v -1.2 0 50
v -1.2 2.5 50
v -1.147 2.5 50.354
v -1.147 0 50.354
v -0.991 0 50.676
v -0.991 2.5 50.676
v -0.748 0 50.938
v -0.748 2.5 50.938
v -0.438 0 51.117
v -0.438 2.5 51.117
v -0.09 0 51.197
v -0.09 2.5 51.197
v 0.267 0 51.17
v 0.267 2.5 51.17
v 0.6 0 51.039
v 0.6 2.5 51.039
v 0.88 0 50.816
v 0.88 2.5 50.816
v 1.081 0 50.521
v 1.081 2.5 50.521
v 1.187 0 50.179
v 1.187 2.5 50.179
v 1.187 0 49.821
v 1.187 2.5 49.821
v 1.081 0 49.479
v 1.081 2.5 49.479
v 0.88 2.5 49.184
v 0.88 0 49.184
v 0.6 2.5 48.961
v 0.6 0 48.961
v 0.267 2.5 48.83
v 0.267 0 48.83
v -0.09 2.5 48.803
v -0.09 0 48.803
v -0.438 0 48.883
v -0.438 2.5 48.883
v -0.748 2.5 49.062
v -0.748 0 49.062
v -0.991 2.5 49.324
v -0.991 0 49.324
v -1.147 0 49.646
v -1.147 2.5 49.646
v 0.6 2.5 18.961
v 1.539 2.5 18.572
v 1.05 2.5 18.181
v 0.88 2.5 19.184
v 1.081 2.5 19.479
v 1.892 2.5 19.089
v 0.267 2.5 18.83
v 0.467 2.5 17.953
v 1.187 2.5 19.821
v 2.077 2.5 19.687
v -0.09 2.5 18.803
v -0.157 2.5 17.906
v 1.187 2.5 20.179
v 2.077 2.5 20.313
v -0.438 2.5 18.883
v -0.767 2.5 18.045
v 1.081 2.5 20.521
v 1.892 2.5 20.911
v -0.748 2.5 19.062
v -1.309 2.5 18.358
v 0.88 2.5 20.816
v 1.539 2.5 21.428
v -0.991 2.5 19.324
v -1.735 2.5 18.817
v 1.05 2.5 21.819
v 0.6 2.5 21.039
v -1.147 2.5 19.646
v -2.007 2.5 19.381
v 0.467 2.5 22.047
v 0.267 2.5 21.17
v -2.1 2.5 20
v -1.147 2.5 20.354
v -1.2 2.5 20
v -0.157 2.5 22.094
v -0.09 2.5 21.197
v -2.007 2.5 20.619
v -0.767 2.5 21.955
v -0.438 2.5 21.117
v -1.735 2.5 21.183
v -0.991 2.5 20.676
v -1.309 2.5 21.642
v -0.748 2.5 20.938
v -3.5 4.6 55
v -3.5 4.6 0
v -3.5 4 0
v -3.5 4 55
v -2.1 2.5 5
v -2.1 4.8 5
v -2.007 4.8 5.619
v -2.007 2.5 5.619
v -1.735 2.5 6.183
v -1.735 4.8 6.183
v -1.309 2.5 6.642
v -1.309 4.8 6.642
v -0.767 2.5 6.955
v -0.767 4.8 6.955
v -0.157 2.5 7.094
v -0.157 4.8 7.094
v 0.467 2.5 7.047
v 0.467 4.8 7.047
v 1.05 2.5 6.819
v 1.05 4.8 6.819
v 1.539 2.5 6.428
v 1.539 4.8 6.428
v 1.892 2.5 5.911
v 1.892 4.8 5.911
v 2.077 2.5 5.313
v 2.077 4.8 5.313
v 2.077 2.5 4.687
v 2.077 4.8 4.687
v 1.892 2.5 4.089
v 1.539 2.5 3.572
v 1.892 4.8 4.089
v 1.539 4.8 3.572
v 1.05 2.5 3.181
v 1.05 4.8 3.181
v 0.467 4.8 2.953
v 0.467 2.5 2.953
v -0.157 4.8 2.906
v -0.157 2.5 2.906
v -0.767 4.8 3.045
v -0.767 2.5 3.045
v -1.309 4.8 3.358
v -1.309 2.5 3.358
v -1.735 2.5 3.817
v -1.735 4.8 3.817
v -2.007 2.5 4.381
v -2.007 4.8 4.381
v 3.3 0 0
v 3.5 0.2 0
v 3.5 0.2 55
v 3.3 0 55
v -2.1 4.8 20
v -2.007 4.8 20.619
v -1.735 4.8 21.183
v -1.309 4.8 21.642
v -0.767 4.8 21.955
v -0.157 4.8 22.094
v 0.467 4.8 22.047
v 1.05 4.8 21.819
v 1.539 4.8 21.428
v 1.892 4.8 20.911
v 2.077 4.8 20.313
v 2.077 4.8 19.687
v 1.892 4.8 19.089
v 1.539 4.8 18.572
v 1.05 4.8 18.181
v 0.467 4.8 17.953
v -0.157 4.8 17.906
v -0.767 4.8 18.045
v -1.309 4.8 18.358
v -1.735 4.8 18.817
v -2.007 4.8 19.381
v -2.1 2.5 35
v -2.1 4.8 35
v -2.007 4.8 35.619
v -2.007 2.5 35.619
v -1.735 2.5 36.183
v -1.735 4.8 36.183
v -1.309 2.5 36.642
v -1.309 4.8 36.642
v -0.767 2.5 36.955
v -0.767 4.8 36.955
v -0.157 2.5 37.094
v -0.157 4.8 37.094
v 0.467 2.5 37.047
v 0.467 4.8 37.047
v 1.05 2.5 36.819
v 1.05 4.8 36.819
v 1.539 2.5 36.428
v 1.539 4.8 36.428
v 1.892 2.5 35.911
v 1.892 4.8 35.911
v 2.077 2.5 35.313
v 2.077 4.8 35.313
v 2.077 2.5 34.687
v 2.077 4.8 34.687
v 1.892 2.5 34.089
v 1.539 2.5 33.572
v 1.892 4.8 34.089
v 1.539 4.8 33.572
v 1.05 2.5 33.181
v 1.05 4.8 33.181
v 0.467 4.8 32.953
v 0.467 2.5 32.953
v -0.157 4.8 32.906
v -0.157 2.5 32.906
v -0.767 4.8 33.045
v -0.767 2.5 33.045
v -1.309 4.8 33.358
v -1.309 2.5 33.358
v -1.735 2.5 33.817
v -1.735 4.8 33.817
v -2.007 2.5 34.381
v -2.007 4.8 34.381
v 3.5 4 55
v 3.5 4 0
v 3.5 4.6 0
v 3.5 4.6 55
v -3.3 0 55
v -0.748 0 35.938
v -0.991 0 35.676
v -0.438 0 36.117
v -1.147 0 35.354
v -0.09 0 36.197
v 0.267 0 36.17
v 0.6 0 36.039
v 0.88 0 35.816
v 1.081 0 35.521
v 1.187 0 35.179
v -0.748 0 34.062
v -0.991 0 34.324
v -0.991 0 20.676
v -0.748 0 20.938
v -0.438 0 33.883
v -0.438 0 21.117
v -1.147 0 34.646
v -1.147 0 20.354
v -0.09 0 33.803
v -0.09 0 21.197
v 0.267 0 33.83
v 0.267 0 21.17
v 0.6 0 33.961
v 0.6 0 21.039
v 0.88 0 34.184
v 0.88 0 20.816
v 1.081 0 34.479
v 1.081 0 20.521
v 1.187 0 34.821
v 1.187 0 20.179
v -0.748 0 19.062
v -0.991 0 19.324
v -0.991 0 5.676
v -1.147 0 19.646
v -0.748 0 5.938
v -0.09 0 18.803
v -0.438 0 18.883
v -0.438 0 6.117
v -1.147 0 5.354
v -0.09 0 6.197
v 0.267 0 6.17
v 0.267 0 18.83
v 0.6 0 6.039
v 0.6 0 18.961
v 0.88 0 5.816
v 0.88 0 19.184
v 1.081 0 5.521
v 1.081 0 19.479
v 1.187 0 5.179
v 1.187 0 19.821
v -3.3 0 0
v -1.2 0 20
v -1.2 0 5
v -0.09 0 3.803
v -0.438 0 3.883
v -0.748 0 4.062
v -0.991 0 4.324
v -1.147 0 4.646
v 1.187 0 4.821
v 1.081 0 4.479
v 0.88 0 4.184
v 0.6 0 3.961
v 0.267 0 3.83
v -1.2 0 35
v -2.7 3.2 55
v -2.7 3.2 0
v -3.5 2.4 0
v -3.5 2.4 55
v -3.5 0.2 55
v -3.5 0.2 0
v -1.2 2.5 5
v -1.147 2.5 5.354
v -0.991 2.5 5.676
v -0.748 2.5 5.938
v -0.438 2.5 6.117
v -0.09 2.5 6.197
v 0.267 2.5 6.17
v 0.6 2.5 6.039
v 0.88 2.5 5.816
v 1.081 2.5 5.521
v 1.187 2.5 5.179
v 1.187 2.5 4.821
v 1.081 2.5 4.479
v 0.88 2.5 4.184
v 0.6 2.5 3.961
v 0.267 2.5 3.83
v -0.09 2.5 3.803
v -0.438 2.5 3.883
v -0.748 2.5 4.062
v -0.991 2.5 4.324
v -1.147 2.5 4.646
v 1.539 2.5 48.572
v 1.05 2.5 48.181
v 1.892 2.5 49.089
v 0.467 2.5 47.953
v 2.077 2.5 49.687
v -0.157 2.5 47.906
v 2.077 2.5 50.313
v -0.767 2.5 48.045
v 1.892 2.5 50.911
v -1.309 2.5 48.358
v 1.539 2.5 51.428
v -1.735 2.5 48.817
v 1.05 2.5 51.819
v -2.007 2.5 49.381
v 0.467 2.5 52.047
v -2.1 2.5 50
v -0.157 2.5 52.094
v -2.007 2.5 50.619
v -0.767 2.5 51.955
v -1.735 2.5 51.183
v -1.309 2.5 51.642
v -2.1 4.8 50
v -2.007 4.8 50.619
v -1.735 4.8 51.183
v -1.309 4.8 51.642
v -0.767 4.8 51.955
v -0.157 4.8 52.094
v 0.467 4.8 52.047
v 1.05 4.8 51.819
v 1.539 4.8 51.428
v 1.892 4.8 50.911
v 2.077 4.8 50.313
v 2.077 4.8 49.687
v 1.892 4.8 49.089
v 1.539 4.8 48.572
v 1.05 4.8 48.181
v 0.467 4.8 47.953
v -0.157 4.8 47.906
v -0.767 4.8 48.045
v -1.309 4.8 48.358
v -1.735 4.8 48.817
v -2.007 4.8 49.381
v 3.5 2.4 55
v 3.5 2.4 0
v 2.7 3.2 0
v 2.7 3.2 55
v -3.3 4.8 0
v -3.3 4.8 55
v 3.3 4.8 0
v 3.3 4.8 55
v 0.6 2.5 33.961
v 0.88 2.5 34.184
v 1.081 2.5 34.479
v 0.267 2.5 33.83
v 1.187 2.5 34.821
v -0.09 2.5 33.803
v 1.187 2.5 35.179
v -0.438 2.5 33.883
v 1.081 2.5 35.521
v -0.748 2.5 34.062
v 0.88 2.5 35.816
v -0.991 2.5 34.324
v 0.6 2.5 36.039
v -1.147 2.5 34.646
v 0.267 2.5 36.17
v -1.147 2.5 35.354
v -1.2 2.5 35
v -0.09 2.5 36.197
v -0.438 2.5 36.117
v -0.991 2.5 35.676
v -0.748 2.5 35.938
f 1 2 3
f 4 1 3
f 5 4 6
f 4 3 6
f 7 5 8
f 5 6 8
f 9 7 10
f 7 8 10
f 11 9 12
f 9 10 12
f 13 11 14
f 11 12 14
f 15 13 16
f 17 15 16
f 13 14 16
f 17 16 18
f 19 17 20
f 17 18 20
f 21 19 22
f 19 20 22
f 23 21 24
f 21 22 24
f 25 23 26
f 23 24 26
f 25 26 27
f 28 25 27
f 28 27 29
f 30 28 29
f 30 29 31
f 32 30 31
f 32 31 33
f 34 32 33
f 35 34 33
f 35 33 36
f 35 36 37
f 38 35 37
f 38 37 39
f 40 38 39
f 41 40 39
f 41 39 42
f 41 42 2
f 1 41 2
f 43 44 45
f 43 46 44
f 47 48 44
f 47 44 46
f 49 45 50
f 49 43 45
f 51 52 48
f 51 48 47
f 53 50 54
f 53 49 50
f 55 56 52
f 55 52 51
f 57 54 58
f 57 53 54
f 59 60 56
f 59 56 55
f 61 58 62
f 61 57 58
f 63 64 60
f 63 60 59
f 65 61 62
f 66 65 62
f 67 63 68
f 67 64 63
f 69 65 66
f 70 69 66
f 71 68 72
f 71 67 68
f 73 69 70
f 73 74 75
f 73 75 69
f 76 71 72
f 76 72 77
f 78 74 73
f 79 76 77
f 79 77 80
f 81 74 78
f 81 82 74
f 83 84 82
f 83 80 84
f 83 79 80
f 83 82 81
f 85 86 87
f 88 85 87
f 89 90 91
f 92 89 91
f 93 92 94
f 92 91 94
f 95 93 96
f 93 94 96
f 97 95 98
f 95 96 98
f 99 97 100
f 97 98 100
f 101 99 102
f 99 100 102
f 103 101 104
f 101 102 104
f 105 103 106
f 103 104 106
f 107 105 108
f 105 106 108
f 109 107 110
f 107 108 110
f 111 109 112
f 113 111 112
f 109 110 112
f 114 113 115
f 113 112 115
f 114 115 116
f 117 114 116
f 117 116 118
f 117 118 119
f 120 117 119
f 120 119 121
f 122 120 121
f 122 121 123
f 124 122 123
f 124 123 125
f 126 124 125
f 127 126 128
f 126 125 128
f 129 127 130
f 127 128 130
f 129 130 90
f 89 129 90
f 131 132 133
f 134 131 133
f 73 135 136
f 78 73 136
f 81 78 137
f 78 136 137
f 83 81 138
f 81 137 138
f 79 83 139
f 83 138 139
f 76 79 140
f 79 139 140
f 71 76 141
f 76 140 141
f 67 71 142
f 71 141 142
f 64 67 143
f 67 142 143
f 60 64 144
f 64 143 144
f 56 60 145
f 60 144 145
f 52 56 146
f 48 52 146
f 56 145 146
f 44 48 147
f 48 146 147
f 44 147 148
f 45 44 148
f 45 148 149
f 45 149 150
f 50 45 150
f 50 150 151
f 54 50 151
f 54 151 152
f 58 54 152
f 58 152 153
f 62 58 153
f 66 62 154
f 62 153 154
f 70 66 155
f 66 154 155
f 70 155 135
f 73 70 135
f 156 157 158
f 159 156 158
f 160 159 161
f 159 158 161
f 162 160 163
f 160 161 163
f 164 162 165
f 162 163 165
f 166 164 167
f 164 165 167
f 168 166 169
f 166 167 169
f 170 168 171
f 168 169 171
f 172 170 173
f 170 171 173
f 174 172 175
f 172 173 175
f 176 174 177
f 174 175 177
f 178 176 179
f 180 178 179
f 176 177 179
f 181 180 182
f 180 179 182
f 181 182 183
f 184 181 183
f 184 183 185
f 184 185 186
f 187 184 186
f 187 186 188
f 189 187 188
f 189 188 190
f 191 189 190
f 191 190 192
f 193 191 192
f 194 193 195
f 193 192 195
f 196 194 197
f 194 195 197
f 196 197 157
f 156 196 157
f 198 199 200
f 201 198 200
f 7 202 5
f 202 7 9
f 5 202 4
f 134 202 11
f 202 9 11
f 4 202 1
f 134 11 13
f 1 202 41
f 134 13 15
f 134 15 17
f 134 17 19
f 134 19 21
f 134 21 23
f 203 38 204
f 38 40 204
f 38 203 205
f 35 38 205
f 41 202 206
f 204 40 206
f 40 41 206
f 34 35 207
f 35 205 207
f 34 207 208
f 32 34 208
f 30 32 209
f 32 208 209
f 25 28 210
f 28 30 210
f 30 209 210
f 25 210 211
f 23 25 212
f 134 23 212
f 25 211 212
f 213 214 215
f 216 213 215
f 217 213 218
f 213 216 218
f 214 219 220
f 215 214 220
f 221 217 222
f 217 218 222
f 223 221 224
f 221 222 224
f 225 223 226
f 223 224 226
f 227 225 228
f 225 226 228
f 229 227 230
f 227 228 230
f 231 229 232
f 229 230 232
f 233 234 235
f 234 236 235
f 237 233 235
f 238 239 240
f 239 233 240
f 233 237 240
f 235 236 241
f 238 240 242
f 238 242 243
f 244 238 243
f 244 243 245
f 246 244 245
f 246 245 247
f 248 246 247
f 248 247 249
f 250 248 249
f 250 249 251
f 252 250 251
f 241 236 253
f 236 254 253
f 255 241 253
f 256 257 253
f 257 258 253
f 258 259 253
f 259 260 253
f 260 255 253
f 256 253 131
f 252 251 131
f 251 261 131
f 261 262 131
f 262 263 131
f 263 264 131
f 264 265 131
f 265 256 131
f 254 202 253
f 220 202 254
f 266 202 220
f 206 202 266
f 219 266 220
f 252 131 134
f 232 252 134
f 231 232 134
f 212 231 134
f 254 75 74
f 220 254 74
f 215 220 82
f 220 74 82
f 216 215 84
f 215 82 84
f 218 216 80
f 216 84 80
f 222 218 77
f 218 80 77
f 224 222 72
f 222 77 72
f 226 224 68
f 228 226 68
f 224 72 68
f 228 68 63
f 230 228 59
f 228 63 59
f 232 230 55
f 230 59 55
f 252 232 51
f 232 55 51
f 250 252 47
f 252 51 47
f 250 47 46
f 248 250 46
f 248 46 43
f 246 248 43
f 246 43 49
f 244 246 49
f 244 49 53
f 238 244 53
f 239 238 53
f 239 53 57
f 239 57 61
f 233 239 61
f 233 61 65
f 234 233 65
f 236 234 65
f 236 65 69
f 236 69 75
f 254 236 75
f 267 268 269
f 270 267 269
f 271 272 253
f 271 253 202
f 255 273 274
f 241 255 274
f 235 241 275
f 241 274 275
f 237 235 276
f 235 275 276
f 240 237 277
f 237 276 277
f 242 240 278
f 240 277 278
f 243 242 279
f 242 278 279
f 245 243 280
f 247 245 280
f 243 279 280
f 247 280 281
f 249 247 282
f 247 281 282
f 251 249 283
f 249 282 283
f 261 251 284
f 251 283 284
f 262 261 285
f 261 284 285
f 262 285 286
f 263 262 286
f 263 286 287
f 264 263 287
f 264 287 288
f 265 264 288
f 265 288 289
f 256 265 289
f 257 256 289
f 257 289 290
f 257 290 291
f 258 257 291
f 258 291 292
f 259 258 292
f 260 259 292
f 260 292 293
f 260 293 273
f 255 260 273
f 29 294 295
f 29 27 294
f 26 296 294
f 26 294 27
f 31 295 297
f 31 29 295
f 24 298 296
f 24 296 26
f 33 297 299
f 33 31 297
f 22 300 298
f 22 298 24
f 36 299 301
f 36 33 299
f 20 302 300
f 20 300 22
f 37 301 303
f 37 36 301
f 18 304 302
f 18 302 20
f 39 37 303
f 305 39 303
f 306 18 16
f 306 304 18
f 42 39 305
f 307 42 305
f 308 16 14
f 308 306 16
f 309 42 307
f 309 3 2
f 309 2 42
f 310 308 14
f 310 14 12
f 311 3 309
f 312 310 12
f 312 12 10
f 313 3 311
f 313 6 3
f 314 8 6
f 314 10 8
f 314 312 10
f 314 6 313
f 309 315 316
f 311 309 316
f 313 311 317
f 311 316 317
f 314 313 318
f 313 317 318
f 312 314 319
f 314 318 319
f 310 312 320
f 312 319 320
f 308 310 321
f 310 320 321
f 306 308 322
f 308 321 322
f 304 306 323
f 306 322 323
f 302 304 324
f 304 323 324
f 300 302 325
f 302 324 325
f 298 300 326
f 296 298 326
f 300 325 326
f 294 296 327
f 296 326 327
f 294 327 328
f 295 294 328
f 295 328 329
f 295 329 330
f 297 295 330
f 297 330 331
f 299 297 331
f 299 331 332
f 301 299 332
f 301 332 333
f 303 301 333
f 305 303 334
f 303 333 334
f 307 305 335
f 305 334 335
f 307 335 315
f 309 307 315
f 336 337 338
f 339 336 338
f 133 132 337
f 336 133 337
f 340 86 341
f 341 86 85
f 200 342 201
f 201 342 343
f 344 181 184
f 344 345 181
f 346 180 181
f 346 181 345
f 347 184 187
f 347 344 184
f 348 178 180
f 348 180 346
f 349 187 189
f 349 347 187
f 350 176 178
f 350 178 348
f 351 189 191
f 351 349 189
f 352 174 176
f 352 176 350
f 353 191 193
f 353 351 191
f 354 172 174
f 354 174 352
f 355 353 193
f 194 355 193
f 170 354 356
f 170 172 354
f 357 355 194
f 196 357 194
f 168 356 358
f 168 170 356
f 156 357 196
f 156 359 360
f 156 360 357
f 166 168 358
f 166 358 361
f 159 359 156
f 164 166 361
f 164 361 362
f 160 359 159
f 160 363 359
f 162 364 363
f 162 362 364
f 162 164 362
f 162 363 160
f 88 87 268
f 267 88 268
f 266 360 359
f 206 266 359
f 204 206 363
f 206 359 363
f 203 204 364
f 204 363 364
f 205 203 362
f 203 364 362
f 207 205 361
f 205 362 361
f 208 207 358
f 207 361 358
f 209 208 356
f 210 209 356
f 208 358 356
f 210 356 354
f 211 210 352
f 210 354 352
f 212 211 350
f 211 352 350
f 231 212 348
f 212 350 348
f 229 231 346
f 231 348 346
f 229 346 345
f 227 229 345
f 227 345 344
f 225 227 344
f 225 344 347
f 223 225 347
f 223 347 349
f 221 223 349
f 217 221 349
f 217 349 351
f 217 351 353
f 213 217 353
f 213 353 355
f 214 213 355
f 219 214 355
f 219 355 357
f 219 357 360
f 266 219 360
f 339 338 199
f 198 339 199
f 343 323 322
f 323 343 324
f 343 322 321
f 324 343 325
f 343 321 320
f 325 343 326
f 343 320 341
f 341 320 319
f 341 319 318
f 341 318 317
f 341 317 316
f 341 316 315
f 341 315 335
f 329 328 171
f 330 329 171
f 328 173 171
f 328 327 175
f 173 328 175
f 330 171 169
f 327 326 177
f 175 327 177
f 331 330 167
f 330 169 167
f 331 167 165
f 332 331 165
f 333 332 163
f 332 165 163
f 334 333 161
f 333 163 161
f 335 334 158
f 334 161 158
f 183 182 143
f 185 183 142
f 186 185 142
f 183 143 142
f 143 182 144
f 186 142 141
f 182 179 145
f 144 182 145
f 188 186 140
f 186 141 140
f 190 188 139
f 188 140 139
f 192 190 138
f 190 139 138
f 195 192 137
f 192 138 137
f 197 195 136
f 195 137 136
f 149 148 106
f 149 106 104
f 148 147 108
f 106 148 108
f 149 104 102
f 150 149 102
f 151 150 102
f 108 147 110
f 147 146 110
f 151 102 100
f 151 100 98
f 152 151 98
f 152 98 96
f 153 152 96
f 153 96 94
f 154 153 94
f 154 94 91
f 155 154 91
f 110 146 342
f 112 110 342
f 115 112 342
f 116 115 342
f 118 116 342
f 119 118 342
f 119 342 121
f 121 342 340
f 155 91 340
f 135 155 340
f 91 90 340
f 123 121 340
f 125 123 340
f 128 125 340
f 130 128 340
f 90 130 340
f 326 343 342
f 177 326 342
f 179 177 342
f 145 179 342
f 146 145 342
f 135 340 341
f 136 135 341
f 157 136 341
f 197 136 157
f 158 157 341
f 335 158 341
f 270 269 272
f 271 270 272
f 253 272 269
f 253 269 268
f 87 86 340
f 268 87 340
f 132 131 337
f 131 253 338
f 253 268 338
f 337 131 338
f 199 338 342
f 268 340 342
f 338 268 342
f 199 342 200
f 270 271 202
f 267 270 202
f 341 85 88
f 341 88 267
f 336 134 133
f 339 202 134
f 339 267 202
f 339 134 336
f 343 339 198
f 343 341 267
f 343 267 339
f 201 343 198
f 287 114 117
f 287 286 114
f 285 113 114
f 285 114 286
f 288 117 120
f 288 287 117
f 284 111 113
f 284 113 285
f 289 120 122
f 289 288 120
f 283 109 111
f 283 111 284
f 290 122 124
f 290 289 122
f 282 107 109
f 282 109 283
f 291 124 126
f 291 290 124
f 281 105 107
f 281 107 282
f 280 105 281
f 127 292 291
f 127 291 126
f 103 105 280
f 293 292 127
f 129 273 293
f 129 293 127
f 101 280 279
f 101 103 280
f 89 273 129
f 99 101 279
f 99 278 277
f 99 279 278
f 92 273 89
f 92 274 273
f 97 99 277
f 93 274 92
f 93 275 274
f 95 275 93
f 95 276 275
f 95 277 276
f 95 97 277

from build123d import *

# Parameters (mm, degrees)
EXTRUDE_1_DEPTH     = 55
SKETCH_2_R          = 2.1
CUT_EXTRUDE_1_DEPTH = 2.3
CHAMFER_1_SIZE      = 0.2
SKETCH_4_R          = 1.2
CUT_EXTRUDE_3_DEPTH = 56.167925464


with BuildPart() as part:
    # 草图1 → 凸台-拉伸1 (new body)
    with BuildSketch(Plane.XY):
        Polygon((-3.5, 0), (3.5, 0), (3.5, 2.4), (2.7, 3.2), (3.5, 4), (3.5, 4.8), (-3.5, 4.8), (-3.5, 4), (-2.7, 3.2), (-3.5, 2.4), align=None)
    extrude(amount=EXTRUDE_1_DEPTH)

    # 草图2 → 切除-拉伸1 (cut)
    with BuildSketch(Plane(origin=(0, 4.8, 0), x_dir=(1, 0, 0), z_dir=(0, 1, 0))):
        with Locations(Location((0, -5, 0), (0, 0, 180))):
            Circle(SKETCH_2_R)
        with Locations(Location((0, -20, 0), (0, 0, 180))):
            Circle(SKETCH_2_R)
        with Locations(Location((0, -35, 0), (0, 0, 180))):
            Circle(SKETCH_2_R)
        with Locations(Location((0, -50, 0), (0, 0, 180))):
            Circle(SKETCH_2_R)
    extrude(amount=-CUT_EXTRUDE_1_DEPTH, mode=Mode.SUBTRACT)

    # 倒角1
    chamfer_1_edges = [part.edges().sort_by_distance(p)[0] for p in [
        (-3.5, 4.8, 27.5),
        (3.5, 4.8, 27.5),
        (3.5, 0, 27.5),
        (-3.5, 0, 27.5),
    ]]
    chamfer(chamfer_1_edges, length=CHAMFER_1_SIZE)

    # 草图4 → 切除-拉伸3 (cut, through all)
    with BuildSketch(Plane(origin=(0, 2.5, 0), x_dir=(1, 0, 0), z_dir=(0, 1, 0))):
        with Locations(Location((0, -5, 0), (0, 0, 180))):
            Circle(SKETCH_4_R)
        with Locations(Location((0, -20, 0), (0, 0, 180))):
            Circle(SKETCH_4_R)
        with Locations(Location((0, -50, 0), (0, 0, 180))):
            Circle(SKETCH_4_R)
        with Locations(Location((0, -35, 0), (0, 0, 180))):
            Circle(SKETCH_4_R)
    extrude(amount=-CUT_EXTRUDE_3_DEPTH, mode=Mode.SUBTRACT)


solid = part.part
